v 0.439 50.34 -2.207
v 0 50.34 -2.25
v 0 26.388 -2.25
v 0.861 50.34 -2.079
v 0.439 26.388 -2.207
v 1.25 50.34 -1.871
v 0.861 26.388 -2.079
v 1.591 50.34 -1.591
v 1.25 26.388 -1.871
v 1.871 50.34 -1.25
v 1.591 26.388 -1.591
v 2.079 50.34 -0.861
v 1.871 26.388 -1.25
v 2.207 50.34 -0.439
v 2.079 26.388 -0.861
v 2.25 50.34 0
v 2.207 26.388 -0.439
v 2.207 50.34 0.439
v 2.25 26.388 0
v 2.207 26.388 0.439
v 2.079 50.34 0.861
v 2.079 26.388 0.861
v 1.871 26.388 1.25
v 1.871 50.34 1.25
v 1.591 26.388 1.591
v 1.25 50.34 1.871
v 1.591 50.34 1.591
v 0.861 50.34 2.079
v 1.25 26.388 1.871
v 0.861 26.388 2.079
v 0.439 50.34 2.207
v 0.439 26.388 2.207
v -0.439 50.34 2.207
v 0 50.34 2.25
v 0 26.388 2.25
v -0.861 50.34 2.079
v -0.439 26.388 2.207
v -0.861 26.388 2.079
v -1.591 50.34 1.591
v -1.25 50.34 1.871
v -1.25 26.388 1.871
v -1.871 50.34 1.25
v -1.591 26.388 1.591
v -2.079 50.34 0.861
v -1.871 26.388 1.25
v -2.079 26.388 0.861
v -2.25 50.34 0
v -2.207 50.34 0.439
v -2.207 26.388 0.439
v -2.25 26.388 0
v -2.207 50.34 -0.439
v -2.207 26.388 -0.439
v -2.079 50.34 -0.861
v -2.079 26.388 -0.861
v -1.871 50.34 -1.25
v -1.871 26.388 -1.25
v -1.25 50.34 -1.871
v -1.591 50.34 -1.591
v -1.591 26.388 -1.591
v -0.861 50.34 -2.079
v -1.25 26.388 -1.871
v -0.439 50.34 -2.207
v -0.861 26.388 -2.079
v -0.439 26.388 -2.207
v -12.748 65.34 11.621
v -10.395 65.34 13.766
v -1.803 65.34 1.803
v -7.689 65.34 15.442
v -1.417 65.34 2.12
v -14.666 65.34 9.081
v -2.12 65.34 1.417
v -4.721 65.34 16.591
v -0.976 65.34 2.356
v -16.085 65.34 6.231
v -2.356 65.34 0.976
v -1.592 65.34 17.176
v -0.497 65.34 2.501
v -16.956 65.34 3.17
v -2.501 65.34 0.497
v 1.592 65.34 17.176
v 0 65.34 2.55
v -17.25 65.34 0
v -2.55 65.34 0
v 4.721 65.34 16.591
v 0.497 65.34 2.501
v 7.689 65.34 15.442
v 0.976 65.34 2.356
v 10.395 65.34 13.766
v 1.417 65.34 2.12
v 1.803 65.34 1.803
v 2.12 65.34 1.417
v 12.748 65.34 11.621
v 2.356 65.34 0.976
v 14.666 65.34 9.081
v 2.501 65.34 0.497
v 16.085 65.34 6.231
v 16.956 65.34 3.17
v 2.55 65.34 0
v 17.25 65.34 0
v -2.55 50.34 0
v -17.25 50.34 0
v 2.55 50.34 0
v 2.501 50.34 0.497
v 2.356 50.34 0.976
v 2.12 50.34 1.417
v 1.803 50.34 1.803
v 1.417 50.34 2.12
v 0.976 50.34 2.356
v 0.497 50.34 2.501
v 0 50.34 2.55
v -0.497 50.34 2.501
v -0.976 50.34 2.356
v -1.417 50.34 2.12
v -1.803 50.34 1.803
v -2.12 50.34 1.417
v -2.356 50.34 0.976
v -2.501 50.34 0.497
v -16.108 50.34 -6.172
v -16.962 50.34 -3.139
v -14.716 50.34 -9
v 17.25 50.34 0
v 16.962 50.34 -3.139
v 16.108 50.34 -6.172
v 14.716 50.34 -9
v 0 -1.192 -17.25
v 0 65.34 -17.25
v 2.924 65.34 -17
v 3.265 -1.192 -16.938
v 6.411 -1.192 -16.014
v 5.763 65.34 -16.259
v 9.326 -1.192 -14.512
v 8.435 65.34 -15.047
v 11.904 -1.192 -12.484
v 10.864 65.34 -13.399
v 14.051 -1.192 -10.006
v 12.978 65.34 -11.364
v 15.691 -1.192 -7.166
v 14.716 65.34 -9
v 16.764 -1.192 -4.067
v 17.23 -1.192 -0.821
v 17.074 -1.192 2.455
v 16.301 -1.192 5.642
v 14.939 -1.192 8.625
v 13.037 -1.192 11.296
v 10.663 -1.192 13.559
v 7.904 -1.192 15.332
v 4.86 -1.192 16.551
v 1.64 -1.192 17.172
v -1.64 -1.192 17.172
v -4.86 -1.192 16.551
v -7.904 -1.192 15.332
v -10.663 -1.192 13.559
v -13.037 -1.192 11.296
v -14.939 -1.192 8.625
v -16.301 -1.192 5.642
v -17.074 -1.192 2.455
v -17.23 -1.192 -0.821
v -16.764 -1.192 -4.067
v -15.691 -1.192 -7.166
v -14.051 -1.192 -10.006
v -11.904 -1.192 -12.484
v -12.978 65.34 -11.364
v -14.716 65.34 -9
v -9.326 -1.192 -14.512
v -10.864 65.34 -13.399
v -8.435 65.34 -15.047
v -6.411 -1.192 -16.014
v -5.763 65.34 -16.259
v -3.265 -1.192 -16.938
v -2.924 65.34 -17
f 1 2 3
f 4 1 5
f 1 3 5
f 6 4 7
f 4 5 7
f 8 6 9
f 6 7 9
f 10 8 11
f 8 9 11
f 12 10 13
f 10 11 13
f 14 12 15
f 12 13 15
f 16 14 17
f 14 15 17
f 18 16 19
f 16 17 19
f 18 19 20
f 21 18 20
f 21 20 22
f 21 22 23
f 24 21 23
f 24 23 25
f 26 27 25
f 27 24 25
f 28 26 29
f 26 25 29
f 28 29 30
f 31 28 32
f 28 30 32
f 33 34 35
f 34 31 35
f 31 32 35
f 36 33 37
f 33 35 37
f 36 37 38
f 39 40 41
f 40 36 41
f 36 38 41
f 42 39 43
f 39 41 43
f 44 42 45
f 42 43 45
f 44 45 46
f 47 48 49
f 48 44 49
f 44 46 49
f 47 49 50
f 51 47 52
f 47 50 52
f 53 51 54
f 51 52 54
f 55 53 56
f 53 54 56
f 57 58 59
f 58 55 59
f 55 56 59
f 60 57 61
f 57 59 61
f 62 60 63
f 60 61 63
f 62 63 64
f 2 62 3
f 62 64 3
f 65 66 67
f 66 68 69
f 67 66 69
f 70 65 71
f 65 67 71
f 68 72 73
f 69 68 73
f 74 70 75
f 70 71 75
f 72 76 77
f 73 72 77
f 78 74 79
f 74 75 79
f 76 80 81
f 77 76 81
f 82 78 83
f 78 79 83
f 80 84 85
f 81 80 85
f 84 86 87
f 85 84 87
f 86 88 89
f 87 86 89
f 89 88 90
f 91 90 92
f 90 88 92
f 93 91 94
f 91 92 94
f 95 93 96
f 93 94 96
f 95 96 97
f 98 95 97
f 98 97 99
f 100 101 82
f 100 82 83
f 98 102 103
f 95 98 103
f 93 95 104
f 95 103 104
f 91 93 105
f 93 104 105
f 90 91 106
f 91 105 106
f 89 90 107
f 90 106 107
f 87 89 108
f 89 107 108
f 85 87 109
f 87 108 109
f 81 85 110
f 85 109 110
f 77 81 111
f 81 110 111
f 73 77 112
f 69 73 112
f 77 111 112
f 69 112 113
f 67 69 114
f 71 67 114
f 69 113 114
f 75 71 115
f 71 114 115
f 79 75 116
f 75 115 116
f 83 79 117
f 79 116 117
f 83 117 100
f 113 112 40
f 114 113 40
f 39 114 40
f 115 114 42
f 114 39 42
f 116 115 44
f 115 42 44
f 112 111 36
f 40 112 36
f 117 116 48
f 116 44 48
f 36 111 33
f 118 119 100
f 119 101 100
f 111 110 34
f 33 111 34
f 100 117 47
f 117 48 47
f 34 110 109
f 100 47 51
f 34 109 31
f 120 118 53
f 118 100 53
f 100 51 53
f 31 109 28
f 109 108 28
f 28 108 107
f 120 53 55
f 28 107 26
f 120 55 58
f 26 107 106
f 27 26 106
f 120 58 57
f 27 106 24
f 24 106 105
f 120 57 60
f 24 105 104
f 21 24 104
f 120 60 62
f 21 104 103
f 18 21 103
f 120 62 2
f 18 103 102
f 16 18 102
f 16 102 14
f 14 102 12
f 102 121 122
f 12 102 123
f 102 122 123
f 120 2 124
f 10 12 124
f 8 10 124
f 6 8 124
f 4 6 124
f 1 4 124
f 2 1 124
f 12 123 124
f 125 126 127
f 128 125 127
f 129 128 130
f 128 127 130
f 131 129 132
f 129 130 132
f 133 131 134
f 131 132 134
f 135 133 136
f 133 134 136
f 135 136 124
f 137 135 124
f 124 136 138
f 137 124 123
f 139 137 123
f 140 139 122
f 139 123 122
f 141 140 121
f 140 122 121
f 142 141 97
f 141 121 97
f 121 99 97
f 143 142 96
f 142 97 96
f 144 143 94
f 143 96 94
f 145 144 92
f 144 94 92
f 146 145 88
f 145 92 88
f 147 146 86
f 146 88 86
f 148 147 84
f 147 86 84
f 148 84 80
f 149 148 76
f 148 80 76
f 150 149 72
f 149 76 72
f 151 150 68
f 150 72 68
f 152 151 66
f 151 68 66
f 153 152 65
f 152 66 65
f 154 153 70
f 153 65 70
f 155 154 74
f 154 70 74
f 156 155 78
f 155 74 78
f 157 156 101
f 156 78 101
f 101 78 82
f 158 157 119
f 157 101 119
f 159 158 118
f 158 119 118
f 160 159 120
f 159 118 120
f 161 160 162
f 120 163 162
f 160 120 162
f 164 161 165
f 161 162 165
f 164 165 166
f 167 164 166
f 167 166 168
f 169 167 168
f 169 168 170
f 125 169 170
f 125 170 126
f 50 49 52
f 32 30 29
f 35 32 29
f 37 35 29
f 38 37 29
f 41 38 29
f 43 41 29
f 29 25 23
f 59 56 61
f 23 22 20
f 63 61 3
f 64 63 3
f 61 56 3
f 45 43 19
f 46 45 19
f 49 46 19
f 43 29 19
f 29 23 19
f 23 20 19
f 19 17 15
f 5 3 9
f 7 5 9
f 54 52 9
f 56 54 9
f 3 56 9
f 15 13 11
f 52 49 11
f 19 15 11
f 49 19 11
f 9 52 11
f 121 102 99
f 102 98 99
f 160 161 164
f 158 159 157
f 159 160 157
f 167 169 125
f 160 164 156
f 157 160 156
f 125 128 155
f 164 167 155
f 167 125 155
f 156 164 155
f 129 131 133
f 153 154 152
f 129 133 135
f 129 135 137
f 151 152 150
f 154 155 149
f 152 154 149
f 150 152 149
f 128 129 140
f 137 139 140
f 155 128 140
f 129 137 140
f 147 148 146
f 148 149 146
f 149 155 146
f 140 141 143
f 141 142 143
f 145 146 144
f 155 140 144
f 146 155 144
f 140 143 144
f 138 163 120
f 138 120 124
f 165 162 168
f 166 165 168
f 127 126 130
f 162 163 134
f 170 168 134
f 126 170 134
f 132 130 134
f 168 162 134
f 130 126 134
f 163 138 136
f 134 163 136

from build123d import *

# Parameters (mm, degrees)
SKETCH_2_W          = 43.624420354
SKETCH_2_H          = 30
CUT_EXTRUDE_1_DEPTH = 9


with BuildPart() as part:
    # Эскиз1 → Повернуть1 (revolve)
    with BuildSketch(Plane(origin=(0, 0, 0), x_dir=(0, 0, -1), z_dir=(1, 0, 0))):
        Polygon((2.25, 26.387863371), (0, 26.387863371), (0, -1.191709959), (17.25, -1.191709959), (17.25, 65.340178843), (2.55, 65.340178843), (2.55, 50.340178843), (2.25, 50.340178843), align=None)
    revolve(axis=Axis((0, 93.464109616, 0), (0, -1, 0)))

    # Эскиз2 → Вырез-Вытянуть1 (cut)
    with BuildSketch(Plane.XY):
        with Locations((0, 65.340178843)):
            Rectangle(SKETCH_2_W, SKETCH_2_H)
    extrude(amount=-CUT_EXTRUDE_1_DEPTH, mode=Mode.SUBTRACT)


solid = part.part
